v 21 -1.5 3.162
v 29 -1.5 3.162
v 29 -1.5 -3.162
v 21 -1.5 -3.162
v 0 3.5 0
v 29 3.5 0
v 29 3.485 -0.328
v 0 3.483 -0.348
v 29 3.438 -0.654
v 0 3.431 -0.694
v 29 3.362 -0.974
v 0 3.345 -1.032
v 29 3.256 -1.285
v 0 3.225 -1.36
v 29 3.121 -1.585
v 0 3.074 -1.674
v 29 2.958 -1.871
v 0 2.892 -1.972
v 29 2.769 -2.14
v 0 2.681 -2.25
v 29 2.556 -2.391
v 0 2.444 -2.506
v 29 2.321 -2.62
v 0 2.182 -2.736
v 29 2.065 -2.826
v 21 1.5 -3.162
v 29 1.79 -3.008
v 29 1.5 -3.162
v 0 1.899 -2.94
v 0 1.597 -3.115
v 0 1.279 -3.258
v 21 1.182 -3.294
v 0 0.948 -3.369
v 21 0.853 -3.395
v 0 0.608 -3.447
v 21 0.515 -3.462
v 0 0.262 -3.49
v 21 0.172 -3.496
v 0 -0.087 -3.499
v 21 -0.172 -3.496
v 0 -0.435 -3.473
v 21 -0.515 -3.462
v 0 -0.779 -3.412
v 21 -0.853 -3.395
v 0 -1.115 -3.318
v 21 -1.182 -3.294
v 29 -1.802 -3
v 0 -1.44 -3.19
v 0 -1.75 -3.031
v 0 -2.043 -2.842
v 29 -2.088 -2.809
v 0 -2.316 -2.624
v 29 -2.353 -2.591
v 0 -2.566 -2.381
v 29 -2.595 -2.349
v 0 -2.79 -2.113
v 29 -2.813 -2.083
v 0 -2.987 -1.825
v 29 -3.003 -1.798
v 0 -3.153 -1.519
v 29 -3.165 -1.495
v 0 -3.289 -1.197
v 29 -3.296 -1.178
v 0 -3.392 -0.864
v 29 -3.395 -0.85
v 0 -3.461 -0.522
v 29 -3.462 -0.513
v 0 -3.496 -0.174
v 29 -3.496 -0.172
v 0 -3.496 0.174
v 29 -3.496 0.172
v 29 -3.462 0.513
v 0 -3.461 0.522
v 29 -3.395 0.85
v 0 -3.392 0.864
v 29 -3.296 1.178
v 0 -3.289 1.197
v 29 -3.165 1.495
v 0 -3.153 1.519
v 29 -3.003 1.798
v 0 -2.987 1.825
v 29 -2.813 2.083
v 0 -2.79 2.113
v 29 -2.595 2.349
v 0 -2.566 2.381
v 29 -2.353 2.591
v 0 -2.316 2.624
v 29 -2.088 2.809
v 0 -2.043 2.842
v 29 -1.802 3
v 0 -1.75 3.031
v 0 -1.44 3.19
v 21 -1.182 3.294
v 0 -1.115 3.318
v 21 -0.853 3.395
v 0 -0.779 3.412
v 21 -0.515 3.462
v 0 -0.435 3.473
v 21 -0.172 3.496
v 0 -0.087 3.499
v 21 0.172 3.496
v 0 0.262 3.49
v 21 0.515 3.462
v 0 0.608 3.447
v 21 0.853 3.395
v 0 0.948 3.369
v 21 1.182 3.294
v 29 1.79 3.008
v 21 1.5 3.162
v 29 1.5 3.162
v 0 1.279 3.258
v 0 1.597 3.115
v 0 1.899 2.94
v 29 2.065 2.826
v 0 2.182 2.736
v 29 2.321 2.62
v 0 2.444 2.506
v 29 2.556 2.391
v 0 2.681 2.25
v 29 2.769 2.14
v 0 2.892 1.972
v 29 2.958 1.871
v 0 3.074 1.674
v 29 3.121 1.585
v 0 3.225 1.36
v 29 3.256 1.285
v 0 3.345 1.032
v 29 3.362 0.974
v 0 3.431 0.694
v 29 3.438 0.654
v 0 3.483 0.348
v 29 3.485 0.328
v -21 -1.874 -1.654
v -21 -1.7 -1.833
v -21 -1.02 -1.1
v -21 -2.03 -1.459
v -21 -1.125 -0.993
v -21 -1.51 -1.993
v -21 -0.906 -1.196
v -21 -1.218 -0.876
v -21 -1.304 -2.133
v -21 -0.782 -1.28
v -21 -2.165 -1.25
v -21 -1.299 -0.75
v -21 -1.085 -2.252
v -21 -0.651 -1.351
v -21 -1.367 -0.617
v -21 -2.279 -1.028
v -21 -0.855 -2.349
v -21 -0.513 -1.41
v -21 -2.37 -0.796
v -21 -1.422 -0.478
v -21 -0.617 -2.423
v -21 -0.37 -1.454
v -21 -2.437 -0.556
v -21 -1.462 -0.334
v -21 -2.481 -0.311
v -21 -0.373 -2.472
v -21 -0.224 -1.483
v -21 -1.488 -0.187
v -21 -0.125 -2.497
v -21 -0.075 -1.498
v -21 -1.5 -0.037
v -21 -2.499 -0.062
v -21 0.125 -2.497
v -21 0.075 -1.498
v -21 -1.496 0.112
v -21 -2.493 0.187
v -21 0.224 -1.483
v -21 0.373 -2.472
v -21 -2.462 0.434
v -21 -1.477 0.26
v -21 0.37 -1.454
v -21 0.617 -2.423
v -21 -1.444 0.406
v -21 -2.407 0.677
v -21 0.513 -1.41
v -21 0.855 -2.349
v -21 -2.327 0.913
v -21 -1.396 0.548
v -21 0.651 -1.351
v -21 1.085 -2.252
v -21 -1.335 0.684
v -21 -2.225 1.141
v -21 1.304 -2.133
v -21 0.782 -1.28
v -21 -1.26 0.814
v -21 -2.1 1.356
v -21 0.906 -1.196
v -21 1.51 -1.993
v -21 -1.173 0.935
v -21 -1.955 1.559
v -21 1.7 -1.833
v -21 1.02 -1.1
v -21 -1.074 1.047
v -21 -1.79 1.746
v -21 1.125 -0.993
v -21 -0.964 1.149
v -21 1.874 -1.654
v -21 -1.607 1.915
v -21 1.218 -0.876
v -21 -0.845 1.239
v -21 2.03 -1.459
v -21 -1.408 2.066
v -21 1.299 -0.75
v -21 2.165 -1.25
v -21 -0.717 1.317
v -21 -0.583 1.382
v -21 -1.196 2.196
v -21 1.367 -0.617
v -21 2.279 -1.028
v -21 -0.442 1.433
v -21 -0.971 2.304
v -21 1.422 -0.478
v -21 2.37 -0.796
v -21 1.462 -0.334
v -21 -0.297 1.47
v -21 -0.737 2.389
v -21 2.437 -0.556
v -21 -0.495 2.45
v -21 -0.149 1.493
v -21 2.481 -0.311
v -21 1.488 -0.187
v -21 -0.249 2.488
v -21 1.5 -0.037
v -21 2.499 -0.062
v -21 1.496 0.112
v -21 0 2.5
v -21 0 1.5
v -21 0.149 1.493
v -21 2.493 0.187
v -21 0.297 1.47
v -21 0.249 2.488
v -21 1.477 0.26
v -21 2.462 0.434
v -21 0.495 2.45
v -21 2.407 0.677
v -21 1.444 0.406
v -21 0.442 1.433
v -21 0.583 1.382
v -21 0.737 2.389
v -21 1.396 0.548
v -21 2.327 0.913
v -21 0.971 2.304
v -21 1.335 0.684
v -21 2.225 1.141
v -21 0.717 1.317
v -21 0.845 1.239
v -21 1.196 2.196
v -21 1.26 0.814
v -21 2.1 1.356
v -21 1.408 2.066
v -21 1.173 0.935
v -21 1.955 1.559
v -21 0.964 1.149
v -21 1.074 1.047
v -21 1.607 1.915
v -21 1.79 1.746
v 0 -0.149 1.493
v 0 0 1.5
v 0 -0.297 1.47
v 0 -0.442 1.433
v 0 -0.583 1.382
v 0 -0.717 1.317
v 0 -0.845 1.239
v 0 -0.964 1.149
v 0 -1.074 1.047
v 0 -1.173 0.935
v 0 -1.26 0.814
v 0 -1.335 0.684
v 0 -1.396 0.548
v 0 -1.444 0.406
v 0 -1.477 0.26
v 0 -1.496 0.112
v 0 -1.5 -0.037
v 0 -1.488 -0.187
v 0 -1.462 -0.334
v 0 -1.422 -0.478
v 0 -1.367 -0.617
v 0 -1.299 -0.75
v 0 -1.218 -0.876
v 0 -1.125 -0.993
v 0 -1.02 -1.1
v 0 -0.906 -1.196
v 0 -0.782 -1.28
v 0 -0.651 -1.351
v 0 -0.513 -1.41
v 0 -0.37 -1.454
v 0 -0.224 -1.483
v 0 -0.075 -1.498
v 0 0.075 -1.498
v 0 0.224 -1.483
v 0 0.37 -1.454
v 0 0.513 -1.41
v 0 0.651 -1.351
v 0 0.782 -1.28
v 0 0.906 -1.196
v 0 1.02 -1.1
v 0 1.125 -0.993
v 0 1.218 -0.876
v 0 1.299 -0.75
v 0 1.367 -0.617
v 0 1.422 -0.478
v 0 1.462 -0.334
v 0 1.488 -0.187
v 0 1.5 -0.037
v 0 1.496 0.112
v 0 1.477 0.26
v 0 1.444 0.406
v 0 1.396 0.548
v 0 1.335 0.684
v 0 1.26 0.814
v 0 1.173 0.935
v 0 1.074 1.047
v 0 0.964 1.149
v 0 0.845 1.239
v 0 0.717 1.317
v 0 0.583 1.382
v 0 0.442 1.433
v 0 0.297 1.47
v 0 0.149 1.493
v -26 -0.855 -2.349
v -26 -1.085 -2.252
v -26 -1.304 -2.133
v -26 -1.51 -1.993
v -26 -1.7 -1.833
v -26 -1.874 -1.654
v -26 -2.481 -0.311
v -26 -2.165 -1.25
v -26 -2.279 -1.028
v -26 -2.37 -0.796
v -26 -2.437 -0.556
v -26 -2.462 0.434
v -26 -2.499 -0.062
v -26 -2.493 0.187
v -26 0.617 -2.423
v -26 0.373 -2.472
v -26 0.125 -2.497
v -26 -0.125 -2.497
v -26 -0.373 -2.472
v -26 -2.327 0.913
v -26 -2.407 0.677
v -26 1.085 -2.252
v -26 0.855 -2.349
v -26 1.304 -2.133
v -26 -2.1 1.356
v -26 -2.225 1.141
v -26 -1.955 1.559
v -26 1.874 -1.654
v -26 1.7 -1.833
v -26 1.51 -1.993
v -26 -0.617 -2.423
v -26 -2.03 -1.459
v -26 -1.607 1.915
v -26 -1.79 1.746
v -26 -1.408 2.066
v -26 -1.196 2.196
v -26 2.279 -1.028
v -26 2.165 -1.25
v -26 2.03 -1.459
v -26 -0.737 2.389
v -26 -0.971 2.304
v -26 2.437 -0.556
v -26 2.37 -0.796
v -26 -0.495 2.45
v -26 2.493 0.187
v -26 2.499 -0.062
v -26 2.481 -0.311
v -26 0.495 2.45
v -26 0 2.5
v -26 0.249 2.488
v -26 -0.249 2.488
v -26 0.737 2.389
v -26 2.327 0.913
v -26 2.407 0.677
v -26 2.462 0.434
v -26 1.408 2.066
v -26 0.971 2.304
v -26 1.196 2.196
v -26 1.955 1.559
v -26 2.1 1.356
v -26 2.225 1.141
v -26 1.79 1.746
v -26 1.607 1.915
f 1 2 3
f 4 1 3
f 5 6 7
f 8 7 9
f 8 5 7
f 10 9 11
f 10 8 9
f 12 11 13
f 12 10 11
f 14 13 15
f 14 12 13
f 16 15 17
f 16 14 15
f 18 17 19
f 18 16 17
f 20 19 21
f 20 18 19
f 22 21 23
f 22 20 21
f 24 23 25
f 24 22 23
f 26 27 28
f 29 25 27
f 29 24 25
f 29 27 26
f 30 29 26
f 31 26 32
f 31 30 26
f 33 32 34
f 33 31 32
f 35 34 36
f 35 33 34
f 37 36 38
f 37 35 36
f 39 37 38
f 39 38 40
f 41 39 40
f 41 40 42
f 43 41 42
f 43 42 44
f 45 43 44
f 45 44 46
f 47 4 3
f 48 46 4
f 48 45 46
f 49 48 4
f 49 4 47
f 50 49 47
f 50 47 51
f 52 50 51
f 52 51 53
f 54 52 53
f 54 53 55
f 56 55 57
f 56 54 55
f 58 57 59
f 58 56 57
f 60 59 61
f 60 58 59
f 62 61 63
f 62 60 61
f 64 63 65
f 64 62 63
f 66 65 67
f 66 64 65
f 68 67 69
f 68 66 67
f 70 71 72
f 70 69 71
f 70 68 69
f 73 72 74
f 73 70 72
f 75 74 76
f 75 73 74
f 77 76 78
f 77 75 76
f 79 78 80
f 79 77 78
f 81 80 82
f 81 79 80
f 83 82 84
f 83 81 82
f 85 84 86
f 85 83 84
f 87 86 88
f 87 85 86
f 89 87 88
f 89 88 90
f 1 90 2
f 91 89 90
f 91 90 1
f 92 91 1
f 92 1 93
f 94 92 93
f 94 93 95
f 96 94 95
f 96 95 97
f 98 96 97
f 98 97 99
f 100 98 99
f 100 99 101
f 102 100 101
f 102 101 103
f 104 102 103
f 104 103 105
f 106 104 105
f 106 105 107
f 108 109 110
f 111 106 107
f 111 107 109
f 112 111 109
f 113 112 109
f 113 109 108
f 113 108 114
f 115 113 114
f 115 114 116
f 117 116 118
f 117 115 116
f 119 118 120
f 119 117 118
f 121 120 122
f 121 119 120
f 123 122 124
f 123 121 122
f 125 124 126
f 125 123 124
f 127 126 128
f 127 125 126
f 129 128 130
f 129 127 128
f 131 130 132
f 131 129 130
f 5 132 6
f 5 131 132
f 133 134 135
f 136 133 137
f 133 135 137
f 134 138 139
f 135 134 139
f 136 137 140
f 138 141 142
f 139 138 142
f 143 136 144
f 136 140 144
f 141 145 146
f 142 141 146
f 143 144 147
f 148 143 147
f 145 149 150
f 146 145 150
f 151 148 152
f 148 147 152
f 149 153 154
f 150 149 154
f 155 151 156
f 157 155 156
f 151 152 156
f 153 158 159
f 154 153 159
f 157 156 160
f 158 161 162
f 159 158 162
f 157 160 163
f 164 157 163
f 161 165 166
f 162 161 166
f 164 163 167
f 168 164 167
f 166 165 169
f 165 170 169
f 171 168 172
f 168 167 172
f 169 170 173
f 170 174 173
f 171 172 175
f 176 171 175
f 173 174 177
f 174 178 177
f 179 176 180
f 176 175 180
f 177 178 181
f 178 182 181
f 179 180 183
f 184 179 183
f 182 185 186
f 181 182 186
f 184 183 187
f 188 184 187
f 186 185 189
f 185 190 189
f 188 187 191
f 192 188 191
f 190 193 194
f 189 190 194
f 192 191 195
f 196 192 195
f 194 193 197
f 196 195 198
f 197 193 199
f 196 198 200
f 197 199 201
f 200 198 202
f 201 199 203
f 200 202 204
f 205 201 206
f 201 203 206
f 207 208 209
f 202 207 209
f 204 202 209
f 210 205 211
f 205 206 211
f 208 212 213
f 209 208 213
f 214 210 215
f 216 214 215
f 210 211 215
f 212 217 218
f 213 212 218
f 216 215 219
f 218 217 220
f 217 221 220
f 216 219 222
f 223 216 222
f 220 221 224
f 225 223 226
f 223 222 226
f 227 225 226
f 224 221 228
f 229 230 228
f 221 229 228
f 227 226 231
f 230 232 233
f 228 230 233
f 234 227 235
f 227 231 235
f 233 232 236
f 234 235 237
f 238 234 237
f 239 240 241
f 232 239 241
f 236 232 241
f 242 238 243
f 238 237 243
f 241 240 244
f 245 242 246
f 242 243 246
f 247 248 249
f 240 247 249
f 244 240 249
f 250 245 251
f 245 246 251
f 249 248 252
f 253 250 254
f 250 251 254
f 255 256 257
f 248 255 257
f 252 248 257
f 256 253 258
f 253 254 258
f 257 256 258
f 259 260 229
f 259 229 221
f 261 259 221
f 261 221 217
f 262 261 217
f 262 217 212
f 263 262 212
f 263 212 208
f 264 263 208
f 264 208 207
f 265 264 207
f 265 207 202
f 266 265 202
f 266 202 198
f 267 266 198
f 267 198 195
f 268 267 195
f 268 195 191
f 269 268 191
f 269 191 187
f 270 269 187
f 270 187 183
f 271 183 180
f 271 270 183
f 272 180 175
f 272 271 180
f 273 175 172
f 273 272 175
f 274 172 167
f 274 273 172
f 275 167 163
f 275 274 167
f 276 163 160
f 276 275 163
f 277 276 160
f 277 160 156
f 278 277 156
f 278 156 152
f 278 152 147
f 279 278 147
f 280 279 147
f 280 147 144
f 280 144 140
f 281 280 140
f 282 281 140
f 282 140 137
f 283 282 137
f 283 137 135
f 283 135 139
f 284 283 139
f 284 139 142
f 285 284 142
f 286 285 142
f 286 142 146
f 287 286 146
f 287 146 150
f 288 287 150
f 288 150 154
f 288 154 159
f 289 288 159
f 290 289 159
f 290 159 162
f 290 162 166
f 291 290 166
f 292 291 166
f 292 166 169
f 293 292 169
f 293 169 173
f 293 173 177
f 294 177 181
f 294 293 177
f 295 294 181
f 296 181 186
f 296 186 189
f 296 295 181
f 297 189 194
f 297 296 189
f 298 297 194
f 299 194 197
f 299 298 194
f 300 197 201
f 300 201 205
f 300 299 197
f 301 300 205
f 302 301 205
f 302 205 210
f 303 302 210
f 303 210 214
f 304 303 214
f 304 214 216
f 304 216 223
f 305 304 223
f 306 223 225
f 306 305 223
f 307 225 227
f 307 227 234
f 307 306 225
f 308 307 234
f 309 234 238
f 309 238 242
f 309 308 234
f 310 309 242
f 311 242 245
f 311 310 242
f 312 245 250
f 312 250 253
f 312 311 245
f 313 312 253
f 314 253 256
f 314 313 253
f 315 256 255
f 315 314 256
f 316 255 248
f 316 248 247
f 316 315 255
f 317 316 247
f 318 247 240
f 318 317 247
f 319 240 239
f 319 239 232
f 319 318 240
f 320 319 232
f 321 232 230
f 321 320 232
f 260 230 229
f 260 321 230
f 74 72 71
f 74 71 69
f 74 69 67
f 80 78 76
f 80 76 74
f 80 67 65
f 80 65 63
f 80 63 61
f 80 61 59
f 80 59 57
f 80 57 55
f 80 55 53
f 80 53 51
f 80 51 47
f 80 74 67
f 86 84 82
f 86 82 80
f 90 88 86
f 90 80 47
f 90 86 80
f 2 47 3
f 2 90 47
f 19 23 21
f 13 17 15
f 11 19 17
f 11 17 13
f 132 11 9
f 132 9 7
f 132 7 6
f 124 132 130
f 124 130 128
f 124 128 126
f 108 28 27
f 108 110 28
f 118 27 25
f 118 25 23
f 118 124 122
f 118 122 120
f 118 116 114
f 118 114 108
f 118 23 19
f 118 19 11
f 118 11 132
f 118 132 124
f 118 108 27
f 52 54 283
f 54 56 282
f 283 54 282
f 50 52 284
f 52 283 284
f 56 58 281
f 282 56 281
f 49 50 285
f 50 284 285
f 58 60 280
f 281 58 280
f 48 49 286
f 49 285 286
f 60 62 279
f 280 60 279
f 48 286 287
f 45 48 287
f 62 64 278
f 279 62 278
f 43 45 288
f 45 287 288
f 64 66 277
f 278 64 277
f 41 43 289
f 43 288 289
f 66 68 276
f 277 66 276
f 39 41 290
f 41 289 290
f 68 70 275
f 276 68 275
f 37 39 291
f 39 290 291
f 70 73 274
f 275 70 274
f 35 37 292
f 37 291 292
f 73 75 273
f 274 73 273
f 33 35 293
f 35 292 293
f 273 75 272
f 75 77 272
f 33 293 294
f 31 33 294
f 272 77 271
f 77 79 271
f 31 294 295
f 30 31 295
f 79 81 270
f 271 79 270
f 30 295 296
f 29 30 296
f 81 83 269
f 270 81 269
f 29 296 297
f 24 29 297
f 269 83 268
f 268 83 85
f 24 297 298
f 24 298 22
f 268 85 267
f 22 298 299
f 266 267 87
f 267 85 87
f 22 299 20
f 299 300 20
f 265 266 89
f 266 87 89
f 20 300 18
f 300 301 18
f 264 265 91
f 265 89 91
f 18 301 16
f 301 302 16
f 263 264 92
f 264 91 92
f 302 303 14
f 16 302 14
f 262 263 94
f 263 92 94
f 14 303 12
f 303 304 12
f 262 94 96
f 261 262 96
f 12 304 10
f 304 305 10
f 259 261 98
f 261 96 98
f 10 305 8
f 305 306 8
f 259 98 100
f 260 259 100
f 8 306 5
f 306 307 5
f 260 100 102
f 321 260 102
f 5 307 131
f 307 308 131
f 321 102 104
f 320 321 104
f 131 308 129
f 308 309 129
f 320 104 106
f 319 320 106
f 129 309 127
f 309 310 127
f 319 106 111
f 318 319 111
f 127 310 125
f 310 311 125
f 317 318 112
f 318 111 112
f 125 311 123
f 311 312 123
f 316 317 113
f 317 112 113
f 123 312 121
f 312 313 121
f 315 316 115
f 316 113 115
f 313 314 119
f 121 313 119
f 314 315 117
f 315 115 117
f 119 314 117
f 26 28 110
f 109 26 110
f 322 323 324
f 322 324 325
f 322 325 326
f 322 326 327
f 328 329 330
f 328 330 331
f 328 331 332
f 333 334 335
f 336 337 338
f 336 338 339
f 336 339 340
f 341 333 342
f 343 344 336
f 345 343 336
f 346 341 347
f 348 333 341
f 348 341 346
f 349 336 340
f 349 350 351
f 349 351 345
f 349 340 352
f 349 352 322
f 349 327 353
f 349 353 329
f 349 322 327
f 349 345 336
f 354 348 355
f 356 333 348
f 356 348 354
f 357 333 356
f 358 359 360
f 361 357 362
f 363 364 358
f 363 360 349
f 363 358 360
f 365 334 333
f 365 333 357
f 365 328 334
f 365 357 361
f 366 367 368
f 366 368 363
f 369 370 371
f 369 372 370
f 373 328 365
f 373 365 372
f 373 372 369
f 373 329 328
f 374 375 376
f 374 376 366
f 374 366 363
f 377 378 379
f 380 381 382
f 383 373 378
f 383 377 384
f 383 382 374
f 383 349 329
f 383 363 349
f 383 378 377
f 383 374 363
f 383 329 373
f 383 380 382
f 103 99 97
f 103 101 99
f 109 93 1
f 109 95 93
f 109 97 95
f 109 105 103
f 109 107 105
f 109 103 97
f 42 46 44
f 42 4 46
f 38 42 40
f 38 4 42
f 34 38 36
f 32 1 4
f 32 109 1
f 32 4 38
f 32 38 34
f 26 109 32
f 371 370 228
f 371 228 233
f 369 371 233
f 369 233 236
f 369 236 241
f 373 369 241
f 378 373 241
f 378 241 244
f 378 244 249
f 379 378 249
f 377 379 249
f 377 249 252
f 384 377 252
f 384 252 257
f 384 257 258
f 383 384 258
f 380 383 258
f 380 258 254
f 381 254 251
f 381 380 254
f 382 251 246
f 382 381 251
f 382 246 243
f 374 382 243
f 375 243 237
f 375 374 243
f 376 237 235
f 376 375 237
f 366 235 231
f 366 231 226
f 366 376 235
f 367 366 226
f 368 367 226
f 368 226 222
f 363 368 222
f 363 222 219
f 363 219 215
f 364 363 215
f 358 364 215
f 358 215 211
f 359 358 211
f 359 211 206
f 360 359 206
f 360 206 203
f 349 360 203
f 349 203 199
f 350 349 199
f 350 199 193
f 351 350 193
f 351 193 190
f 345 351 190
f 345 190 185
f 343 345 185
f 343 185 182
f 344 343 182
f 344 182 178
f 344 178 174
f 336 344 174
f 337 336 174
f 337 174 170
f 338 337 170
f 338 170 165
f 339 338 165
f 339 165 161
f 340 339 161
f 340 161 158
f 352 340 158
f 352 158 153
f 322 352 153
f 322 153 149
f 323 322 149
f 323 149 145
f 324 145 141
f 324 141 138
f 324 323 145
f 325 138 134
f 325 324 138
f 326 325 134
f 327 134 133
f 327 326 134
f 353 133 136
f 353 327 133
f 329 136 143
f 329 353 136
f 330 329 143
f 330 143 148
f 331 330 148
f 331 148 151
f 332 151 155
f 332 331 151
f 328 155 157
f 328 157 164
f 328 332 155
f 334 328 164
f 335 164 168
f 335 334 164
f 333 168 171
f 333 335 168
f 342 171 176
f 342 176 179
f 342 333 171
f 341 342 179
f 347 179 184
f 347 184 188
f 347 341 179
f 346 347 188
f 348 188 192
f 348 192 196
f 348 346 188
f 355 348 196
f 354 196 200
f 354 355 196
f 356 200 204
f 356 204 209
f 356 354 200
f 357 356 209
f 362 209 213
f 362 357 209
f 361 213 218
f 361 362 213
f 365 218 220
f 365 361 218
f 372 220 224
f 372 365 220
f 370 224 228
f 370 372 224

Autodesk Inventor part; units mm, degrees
ref_plane "YZ Plane" through (0, 0, 0) normal (1, 0, 0) x (0, 1, 0)
ref_plane "XZ Plane" through (0, 0, 0) normal (0, 1, 0) x (-1, 0, 0)
ref_plane "XY Plane" through (0, 0, 0) normal (0, 0, 1) x (1, 0, 0)
sketch "Sketch1" plane through (0, 0, 0) normal (1, 0, 0) x (0, 1, 0)
  circle A0 centre (0, 0) radius 3.5
  dimension "d0" = 7
extrude "Extrusion1" add sketch "Sketch1" along normal blind 29
sketch "Sketch2" plane through (29, 0, 0) normal (1, 0, 0) x (0, 0, -1)
  line L0 (-5, -1.5) -> (5, -1.5)
  line L1 (5, -1.5) -> (5, 1.5)
  line L2 (5, 1.5) -> (-5, 1.5)
  line L3 (-5, 1.5) -> (-5, -1.5)
  line L4 (-5, -1.5) -> (5, 1.5) construction
  line L5 (5, -1.5) -> (-5, 1.5) construction
  point P0 (0, 0)
  dimension "d3" = 10
  dimension "d4" = 3
extrude "Extrusion2" cut sketch "Sketch2" against normal blind 8
sketch "Sketch3" plane through (0, 0, 0) normal (-1, 0, 0) x (0, 0, 1)
  circle A0 centre (0, 0) radius 1.5
  dimension "d7" = 3
extrude "Extrusion3" add sketch "Sketch3" along normal blind 26
sketch "Sketch4" plane through (-26, 0, 0) normal (-1, 0, 0) x (0, 0, 1)
  circle A0 centre (0, 0) radius 2.5
  dimension "d10" = 5
extrude "Extrusion4" add sketch "Sketch4" against normal blind 5
properties part number "solenoid piston"
